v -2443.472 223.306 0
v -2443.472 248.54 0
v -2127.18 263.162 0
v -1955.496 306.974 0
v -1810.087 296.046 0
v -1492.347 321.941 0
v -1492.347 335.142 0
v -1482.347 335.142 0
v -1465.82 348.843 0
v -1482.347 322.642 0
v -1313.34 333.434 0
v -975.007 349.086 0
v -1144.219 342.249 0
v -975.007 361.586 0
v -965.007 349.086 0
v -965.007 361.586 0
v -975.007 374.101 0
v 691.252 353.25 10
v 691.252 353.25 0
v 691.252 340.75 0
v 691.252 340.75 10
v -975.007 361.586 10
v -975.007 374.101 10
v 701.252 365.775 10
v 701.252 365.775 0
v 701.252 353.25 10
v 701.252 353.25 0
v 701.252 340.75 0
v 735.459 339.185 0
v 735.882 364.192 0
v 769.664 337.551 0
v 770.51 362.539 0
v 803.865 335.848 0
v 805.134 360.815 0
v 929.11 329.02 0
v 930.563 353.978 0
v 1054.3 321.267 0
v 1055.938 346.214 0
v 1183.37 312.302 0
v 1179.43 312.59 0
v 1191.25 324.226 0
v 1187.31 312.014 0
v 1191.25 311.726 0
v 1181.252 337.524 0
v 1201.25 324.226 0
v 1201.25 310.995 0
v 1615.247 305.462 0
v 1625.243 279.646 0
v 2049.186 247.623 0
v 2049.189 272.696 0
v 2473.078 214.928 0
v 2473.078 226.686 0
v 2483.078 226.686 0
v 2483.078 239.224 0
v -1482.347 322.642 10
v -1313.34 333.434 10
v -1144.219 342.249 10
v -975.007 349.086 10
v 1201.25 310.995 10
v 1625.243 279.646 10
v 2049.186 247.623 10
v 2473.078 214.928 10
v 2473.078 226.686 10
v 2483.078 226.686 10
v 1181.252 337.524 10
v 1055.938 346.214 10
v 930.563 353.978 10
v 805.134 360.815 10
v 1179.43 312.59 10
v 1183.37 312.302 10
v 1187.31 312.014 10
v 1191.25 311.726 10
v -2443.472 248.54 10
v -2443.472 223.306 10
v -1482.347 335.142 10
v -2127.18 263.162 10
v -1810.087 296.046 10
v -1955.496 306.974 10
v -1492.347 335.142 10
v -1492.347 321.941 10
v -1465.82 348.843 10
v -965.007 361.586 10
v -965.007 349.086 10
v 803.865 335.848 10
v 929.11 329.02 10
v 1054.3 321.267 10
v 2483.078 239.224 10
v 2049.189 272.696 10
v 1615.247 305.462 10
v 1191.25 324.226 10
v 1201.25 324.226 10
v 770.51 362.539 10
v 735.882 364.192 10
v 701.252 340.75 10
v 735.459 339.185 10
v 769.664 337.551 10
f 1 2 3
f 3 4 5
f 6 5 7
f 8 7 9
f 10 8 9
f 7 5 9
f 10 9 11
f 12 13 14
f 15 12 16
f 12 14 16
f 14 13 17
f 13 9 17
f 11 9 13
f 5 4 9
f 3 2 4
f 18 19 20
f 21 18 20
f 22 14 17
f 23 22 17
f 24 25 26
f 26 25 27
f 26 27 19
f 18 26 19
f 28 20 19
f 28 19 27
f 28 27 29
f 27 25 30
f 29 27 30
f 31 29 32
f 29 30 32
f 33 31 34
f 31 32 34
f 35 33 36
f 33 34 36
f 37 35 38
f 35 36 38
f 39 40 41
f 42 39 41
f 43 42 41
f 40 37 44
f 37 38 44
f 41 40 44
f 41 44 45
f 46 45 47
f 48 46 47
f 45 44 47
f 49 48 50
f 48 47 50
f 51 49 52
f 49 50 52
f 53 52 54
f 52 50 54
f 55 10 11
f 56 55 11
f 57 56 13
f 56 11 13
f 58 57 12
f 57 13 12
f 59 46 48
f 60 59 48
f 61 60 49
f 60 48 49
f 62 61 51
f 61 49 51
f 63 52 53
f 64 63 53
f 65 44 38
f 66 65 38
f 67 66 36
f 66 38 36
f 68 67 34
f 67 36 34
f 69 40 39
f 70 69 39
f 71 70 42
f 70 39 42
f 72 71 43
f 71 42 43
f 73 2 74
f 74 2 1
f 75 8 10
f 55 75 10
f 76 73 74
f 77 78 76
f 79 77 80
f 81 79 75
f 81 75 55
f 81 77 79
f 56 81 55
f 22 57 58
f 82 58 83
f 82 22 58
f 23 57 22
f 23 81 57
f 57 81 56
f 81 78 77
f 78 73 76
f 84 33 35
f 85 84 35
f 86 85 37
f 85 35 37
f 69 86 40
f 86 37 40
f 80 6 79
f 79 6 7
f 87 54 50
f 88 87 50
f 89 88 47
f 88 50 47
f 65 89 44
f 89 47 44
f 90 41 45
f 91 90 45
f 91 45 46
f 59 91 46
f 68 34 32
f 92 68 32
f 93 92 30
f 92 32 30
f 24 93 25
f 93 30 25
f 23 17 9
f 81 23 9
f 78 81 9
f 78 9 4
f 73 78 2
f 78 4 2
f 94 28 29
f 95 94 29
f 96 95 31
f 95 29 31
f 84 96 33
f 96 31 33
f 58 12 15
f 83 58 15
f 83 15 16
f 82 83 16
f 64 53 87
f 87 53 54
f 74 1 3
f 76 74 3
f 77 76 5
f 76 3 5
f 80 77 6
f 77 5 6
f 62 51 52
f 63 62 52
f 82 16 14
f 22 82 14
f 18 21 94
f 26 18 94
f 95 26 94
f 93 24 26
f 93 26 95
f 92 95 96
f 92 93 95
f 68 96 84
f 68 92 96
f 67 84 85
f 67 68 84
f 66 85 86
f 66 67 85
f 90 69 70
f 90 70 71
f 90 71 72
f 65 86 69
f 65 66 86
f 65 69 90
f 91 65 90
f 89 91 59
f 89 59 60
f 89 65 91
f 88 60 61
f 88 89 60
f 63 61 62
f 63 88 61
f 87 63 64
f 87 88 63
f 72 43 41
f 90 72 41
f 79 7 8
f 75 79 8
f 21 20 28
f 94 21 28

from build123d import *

# Parameters (mm, degrees)
BOSS_EXTRUDE1_DEPTH   = 10
BOSS_EXTRUDE1_2_DEPTH = 10


with BuildPart() as part:
    # Sketch1 → Boss-Extrude1 (new body)
    with BuildSketch(Plane.XY):
        with BuildLine():
            ThreePointArc((805.133639253, 360.815398634), (753.196478916, 363.374685055), (701.251734504, 365.775122282))
            Line((701.251734504, 365.775122282), (701.251734504, 353.250144955))
            Line((701.251734504, 353.250144955), (691.251734504, 353.250144955))
            Line((691.251734504, 353.250144955), (691.251734504, 340.750144955))
            Line((691.251734504, 340.750144955), (701.251734504, 340.750144955))
            ThreePointArc((701.251734504, 340.750144955), (752.562093664, 338.376486624), (803.865036814, 335.847606424))
            ThreePointArc((803.865036814, 335.847606424), (991.712012091, 325.259367188), (1179.430120773, 312.590168174))
            ThreePointArc((1179.430120773, 312.590168174), (1185.340125552, 312.158324881), (1191.250120775, 311.726350832))
            Line((1191.250120775, 311.726350832), (1191.250120775, 324.226350832))
            Line((1191.250120775, 324.226350832), (1201.250120775, 324.226350832))
            Line((1201.250120775, 324.226350832), (1201.250120775, 310.99513029))
            ThreePointArc((1201.250120775, 310.99513029), (1837.221006456, 263.718414373), (2473.077522104, 214.927566772))
            Line((2473.077522104, 214.927566772), (2473.077522104, 226.686009709))
            Line((2473.077522104, 226.686009709), (2483.077522104, 226.686009709))
            Line((2483.077522104, 226.686009709), (2483.077522104, 239.223942192))
            ThreePointArc((2483.077522104, 239.223942192), (1832.224516513, 289.16695334), (1181.251734504, 337.52371432))
            ThreePointArc((1181.251734504, 337.52371432), (993.257215053, 350.211568449), (805.133639253, 360.815398634))
        make_face()
    extrude(amount=BOSS_EXTRUDE1_DEPTH)


with BuildPart() as body_2:
    # Sketch1 → Boss-Extrude1 2 (new body)
    with BuildSketch(Plane.XY):
        with BuildLine():
            Line((-975.006665926, 361.586251126), (-975.006665926, 374.101140921))
            ThreePointArc((-975.006665926, 374.101140921), (-1710.835170262, 329.982333834), (-2443.472345252, 248.540165679))
            Line((-2443.472345252, 248.540165679), (-2443.472345252, 223.306348579))
            ThreePointArc((-2443.472345252, 223.306348579), (-1968.723868859, 280.476468865), (-1492.346665926, 321.940899607))
            Line((-1492.346665926, 321.940899607), (-1492.346665926, 335.141693375))
            Line((-1492.346665926, 335.141693375), (-1482.346665926, 335.141693375))
            Line((-1482.346665926, 335.141693375), (-1482.346665926, 322.641693375))
            ThreePointArc((-1482.346665926, 322.641693375), (-1228.792641889, 338.088976188), (-975.006665926, 349.086251126))
            Line((-975.006665926, 349.086251126), (-965.006665926, 349.086251126))
            Line((-965.006665926, 349.086251126), (-965.006665926, 361.586251126))
            Line((-965.006665926, 361.586251126), (-975.006665926, 361.586251126))
        make_face()
    extrude(amount=BOSS_EXTRUDE1_2_DEPTH)


solid = Compound([part.part, body_2.part])
